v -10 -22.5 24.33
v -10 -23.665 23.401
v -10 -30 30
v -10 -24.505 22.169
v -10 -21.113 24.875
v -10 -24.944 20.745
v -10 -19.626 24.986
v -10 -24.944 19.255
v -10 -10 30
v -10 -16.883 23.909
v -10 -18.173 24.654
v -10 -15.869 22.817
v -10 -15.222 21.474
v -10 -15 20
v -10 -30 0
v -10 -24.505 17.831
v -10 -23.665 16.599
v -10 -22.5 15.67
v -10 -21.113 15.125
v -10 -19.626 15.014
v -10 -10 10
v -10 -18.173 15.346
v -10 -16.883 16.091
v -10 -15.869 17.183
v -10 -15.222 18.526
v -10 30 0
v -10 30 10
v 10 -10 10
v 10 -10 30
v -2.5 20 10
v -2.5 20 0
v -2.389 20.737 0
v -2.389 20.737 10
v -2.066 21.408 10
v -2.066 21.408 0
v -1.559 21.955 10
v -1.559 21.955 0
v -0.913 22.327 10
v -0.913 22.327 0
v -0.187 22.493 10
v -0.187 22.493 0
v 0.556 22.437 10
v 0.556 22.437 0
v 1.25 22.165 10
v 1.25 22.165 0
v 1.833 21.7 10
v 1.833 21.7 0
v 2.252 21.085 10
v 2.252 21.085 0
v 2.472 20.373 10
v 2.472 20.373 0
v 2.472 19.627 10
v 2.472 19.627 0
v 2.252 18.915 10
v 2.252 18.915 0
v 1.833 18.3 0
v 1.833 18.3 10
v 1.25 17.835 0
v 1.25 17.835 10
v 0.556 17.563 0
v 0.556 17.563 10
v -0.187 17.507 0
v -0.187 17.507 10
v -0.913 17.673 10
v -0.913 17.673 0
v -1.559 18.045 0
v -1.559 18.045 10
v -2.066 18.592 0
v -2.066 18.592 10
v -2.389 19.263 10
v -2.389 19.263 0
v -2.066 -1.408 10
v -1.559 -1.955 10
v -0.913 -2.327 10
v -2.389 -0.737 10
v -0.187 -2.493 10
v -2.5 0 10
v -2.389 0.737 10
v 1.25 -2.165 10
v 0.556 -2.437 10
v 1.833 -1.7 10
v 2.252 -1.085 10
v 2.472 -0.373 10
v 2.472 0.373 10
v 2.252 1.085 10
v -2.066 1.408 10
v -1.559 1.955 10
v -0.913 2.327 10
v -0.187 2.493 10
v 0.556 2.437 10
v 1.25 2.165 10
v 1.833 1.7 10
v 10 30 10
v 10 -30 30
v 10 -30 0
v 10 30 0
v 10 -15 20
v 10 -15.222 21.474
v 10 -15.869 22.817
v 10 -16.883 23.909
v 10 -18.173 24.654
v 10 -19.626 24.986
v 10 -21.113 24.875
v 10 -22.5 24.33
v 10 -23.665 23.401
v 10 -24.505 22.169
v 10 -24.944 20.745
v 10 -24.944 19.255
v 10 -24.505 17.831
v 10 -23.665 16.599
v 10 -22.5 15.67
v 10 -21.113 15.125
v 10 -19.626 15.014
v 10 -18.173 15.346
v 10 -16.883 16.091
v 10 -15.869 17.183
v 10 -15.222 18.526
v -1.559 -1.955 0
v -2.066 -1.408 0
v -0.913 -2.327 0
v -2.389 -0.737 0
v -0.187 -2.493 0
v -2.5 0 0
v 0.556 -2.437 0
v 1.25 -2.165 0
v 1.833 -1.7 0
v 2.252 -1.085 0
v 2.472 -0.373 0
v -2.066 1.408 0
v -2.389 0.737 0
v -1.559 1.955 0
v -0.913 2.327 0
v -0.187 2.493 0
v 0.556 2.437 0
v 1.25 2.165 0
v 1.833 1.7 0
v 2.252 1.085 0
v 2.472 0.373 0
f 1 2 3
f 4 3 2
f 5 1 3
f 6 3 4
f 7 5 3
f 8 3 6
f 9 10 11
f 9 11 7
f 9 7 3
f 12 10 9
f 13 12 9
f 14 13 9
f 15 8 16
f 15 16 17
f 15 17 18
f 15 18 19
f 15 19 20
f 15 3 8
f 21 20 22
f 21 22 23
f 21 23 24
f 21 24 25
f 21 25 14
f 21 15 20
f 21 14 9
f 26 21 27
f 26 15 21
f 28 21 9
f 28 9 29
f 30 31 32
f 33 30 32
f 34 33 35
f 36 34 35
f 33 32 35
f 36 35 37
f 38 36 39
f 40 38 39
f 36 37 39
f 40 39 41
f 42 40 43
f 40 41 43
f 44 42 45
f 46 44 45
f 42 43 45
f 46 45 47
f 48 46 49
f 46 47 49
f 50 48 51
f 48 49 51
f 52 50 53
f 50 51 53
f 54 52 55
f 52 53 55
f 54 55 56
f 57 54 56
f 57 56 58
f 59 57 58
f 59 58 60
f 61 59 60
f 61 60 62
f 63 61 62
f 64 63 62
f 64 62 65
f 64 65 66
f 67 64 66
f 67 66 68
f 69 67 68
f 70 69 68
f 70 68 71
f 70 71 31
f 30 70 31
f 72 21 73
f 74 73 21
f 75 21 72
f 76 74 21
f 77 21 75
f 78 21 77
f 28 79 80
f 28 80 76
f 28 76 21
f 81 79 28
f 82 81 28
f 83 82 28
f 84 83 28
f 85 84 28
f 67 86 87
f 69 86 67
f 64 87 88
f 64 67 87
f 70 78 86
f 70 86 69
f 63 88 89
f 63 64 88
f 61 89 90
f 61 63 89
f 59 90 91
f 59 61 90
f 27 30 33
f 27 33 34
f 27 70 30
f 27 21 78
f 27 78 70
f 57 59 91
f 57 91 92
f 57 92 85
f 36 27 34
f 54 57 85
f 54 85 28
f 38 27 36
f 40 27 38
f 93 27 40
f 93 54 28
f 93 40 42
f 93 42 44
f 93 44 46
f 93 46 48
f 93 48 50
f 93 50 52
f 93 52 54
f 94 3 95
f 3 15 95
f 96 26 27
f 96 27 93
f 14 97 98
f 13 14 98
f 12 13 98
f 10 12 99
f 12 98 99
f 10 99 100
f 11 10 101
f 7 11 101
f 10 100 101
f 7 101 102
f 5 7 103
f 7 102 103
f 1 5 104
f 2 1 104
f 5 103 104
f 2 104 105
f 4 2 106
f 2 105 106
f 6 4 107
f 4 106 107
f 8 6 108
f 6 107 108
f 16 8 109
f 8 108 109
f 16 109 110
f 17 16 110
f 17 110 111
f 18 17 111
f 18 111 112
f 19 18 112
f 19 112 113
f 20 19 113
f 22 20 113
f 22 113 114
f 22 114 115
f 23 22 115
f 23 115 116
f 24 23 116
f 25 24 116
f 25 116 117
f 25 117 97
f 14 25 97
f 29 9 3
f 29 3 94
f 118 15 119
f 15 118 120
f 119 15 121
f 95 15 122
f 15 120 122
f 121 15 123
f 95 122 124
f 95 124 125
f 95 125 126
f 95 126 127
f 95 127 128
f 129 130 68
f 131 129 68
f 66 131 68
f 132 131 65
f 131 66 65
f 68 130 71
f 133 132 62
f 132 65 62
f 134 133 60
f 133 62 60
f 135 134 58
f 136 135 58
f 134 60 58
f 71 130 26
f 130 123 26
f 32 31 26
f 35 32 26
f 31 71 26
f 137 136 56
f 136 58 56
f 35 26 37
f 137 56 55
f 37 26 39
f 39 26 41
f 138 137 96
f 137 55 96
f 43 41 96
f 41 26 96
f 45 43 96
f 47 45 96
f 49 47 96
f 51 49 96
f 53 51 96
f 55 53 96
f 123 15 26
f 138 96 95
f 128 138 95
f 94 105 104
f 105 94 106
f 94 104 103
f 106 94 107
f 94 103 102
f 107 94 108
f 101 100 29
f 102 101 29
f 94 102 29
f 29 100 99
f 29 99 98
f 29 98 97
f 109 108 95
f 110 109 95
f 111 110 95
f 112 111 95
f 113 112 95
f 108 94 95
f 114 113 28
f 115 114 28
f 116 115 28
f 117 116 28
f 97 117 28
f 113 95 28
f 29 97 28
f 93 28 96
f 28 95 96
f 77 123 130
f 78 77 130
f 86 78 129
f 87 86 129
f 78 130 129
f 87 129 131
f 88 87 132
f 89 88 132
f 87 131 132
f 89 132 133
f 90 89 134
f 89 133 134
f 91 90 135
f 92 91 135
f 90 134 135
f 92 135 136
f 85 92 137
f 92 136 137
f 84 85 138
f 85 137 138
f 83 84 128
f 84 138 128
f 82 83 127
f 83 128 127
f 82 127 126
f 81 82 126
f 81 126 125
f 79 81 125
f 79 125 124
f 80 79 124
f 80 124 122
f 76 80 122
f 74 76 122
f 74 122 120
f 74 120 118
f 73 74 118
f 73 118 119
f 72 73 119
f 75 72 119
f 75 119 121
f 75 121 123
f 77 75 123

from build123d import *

# Parameters (mm, degrees)
F0_W     = 20
F0_H     = 60
F1_DEPTH = 10
F2_W     = 20
F2_H     = 20
F3_DEPTH = 20
F5_D     = 5
F7_D     = 5
F9_D     = 10


with BuildPart() as f1:
    # F0 (on Top) → F1 (new body)
    with BuildSketch(Plane.XY):
        Rectangle(F0_W, F0_H)
    extrude(amount=F1_DEPTH)

    # F2 (on face) → F3 (join)
    with BuildSketch(Plane.XY.offset(10)):
        with Locations((0, -20)):
            Rectangle(F2_W, F2_H)
    extrude(amount=F3_DEPTH)

    # F5 (through all)
    with Locations(Plane.XY.offset(10)):
        with Locations((0, 20)):
            Hole(F5_D / 2)

    # F7 (through all)
    with Locations(Plane.XY.offset(10)):
        with Locations((0, 0)):
            Hole(F7_D / 2)

    # F9 (through all)
    with Locations(Plane(origin=(-10, 0, 0), x_dir=(0, -1, 0), z_dir=(-1, 0, 0))):
        with Locations((20, 20)):
            Hole(F9_D / 2)


solid = f1.part
